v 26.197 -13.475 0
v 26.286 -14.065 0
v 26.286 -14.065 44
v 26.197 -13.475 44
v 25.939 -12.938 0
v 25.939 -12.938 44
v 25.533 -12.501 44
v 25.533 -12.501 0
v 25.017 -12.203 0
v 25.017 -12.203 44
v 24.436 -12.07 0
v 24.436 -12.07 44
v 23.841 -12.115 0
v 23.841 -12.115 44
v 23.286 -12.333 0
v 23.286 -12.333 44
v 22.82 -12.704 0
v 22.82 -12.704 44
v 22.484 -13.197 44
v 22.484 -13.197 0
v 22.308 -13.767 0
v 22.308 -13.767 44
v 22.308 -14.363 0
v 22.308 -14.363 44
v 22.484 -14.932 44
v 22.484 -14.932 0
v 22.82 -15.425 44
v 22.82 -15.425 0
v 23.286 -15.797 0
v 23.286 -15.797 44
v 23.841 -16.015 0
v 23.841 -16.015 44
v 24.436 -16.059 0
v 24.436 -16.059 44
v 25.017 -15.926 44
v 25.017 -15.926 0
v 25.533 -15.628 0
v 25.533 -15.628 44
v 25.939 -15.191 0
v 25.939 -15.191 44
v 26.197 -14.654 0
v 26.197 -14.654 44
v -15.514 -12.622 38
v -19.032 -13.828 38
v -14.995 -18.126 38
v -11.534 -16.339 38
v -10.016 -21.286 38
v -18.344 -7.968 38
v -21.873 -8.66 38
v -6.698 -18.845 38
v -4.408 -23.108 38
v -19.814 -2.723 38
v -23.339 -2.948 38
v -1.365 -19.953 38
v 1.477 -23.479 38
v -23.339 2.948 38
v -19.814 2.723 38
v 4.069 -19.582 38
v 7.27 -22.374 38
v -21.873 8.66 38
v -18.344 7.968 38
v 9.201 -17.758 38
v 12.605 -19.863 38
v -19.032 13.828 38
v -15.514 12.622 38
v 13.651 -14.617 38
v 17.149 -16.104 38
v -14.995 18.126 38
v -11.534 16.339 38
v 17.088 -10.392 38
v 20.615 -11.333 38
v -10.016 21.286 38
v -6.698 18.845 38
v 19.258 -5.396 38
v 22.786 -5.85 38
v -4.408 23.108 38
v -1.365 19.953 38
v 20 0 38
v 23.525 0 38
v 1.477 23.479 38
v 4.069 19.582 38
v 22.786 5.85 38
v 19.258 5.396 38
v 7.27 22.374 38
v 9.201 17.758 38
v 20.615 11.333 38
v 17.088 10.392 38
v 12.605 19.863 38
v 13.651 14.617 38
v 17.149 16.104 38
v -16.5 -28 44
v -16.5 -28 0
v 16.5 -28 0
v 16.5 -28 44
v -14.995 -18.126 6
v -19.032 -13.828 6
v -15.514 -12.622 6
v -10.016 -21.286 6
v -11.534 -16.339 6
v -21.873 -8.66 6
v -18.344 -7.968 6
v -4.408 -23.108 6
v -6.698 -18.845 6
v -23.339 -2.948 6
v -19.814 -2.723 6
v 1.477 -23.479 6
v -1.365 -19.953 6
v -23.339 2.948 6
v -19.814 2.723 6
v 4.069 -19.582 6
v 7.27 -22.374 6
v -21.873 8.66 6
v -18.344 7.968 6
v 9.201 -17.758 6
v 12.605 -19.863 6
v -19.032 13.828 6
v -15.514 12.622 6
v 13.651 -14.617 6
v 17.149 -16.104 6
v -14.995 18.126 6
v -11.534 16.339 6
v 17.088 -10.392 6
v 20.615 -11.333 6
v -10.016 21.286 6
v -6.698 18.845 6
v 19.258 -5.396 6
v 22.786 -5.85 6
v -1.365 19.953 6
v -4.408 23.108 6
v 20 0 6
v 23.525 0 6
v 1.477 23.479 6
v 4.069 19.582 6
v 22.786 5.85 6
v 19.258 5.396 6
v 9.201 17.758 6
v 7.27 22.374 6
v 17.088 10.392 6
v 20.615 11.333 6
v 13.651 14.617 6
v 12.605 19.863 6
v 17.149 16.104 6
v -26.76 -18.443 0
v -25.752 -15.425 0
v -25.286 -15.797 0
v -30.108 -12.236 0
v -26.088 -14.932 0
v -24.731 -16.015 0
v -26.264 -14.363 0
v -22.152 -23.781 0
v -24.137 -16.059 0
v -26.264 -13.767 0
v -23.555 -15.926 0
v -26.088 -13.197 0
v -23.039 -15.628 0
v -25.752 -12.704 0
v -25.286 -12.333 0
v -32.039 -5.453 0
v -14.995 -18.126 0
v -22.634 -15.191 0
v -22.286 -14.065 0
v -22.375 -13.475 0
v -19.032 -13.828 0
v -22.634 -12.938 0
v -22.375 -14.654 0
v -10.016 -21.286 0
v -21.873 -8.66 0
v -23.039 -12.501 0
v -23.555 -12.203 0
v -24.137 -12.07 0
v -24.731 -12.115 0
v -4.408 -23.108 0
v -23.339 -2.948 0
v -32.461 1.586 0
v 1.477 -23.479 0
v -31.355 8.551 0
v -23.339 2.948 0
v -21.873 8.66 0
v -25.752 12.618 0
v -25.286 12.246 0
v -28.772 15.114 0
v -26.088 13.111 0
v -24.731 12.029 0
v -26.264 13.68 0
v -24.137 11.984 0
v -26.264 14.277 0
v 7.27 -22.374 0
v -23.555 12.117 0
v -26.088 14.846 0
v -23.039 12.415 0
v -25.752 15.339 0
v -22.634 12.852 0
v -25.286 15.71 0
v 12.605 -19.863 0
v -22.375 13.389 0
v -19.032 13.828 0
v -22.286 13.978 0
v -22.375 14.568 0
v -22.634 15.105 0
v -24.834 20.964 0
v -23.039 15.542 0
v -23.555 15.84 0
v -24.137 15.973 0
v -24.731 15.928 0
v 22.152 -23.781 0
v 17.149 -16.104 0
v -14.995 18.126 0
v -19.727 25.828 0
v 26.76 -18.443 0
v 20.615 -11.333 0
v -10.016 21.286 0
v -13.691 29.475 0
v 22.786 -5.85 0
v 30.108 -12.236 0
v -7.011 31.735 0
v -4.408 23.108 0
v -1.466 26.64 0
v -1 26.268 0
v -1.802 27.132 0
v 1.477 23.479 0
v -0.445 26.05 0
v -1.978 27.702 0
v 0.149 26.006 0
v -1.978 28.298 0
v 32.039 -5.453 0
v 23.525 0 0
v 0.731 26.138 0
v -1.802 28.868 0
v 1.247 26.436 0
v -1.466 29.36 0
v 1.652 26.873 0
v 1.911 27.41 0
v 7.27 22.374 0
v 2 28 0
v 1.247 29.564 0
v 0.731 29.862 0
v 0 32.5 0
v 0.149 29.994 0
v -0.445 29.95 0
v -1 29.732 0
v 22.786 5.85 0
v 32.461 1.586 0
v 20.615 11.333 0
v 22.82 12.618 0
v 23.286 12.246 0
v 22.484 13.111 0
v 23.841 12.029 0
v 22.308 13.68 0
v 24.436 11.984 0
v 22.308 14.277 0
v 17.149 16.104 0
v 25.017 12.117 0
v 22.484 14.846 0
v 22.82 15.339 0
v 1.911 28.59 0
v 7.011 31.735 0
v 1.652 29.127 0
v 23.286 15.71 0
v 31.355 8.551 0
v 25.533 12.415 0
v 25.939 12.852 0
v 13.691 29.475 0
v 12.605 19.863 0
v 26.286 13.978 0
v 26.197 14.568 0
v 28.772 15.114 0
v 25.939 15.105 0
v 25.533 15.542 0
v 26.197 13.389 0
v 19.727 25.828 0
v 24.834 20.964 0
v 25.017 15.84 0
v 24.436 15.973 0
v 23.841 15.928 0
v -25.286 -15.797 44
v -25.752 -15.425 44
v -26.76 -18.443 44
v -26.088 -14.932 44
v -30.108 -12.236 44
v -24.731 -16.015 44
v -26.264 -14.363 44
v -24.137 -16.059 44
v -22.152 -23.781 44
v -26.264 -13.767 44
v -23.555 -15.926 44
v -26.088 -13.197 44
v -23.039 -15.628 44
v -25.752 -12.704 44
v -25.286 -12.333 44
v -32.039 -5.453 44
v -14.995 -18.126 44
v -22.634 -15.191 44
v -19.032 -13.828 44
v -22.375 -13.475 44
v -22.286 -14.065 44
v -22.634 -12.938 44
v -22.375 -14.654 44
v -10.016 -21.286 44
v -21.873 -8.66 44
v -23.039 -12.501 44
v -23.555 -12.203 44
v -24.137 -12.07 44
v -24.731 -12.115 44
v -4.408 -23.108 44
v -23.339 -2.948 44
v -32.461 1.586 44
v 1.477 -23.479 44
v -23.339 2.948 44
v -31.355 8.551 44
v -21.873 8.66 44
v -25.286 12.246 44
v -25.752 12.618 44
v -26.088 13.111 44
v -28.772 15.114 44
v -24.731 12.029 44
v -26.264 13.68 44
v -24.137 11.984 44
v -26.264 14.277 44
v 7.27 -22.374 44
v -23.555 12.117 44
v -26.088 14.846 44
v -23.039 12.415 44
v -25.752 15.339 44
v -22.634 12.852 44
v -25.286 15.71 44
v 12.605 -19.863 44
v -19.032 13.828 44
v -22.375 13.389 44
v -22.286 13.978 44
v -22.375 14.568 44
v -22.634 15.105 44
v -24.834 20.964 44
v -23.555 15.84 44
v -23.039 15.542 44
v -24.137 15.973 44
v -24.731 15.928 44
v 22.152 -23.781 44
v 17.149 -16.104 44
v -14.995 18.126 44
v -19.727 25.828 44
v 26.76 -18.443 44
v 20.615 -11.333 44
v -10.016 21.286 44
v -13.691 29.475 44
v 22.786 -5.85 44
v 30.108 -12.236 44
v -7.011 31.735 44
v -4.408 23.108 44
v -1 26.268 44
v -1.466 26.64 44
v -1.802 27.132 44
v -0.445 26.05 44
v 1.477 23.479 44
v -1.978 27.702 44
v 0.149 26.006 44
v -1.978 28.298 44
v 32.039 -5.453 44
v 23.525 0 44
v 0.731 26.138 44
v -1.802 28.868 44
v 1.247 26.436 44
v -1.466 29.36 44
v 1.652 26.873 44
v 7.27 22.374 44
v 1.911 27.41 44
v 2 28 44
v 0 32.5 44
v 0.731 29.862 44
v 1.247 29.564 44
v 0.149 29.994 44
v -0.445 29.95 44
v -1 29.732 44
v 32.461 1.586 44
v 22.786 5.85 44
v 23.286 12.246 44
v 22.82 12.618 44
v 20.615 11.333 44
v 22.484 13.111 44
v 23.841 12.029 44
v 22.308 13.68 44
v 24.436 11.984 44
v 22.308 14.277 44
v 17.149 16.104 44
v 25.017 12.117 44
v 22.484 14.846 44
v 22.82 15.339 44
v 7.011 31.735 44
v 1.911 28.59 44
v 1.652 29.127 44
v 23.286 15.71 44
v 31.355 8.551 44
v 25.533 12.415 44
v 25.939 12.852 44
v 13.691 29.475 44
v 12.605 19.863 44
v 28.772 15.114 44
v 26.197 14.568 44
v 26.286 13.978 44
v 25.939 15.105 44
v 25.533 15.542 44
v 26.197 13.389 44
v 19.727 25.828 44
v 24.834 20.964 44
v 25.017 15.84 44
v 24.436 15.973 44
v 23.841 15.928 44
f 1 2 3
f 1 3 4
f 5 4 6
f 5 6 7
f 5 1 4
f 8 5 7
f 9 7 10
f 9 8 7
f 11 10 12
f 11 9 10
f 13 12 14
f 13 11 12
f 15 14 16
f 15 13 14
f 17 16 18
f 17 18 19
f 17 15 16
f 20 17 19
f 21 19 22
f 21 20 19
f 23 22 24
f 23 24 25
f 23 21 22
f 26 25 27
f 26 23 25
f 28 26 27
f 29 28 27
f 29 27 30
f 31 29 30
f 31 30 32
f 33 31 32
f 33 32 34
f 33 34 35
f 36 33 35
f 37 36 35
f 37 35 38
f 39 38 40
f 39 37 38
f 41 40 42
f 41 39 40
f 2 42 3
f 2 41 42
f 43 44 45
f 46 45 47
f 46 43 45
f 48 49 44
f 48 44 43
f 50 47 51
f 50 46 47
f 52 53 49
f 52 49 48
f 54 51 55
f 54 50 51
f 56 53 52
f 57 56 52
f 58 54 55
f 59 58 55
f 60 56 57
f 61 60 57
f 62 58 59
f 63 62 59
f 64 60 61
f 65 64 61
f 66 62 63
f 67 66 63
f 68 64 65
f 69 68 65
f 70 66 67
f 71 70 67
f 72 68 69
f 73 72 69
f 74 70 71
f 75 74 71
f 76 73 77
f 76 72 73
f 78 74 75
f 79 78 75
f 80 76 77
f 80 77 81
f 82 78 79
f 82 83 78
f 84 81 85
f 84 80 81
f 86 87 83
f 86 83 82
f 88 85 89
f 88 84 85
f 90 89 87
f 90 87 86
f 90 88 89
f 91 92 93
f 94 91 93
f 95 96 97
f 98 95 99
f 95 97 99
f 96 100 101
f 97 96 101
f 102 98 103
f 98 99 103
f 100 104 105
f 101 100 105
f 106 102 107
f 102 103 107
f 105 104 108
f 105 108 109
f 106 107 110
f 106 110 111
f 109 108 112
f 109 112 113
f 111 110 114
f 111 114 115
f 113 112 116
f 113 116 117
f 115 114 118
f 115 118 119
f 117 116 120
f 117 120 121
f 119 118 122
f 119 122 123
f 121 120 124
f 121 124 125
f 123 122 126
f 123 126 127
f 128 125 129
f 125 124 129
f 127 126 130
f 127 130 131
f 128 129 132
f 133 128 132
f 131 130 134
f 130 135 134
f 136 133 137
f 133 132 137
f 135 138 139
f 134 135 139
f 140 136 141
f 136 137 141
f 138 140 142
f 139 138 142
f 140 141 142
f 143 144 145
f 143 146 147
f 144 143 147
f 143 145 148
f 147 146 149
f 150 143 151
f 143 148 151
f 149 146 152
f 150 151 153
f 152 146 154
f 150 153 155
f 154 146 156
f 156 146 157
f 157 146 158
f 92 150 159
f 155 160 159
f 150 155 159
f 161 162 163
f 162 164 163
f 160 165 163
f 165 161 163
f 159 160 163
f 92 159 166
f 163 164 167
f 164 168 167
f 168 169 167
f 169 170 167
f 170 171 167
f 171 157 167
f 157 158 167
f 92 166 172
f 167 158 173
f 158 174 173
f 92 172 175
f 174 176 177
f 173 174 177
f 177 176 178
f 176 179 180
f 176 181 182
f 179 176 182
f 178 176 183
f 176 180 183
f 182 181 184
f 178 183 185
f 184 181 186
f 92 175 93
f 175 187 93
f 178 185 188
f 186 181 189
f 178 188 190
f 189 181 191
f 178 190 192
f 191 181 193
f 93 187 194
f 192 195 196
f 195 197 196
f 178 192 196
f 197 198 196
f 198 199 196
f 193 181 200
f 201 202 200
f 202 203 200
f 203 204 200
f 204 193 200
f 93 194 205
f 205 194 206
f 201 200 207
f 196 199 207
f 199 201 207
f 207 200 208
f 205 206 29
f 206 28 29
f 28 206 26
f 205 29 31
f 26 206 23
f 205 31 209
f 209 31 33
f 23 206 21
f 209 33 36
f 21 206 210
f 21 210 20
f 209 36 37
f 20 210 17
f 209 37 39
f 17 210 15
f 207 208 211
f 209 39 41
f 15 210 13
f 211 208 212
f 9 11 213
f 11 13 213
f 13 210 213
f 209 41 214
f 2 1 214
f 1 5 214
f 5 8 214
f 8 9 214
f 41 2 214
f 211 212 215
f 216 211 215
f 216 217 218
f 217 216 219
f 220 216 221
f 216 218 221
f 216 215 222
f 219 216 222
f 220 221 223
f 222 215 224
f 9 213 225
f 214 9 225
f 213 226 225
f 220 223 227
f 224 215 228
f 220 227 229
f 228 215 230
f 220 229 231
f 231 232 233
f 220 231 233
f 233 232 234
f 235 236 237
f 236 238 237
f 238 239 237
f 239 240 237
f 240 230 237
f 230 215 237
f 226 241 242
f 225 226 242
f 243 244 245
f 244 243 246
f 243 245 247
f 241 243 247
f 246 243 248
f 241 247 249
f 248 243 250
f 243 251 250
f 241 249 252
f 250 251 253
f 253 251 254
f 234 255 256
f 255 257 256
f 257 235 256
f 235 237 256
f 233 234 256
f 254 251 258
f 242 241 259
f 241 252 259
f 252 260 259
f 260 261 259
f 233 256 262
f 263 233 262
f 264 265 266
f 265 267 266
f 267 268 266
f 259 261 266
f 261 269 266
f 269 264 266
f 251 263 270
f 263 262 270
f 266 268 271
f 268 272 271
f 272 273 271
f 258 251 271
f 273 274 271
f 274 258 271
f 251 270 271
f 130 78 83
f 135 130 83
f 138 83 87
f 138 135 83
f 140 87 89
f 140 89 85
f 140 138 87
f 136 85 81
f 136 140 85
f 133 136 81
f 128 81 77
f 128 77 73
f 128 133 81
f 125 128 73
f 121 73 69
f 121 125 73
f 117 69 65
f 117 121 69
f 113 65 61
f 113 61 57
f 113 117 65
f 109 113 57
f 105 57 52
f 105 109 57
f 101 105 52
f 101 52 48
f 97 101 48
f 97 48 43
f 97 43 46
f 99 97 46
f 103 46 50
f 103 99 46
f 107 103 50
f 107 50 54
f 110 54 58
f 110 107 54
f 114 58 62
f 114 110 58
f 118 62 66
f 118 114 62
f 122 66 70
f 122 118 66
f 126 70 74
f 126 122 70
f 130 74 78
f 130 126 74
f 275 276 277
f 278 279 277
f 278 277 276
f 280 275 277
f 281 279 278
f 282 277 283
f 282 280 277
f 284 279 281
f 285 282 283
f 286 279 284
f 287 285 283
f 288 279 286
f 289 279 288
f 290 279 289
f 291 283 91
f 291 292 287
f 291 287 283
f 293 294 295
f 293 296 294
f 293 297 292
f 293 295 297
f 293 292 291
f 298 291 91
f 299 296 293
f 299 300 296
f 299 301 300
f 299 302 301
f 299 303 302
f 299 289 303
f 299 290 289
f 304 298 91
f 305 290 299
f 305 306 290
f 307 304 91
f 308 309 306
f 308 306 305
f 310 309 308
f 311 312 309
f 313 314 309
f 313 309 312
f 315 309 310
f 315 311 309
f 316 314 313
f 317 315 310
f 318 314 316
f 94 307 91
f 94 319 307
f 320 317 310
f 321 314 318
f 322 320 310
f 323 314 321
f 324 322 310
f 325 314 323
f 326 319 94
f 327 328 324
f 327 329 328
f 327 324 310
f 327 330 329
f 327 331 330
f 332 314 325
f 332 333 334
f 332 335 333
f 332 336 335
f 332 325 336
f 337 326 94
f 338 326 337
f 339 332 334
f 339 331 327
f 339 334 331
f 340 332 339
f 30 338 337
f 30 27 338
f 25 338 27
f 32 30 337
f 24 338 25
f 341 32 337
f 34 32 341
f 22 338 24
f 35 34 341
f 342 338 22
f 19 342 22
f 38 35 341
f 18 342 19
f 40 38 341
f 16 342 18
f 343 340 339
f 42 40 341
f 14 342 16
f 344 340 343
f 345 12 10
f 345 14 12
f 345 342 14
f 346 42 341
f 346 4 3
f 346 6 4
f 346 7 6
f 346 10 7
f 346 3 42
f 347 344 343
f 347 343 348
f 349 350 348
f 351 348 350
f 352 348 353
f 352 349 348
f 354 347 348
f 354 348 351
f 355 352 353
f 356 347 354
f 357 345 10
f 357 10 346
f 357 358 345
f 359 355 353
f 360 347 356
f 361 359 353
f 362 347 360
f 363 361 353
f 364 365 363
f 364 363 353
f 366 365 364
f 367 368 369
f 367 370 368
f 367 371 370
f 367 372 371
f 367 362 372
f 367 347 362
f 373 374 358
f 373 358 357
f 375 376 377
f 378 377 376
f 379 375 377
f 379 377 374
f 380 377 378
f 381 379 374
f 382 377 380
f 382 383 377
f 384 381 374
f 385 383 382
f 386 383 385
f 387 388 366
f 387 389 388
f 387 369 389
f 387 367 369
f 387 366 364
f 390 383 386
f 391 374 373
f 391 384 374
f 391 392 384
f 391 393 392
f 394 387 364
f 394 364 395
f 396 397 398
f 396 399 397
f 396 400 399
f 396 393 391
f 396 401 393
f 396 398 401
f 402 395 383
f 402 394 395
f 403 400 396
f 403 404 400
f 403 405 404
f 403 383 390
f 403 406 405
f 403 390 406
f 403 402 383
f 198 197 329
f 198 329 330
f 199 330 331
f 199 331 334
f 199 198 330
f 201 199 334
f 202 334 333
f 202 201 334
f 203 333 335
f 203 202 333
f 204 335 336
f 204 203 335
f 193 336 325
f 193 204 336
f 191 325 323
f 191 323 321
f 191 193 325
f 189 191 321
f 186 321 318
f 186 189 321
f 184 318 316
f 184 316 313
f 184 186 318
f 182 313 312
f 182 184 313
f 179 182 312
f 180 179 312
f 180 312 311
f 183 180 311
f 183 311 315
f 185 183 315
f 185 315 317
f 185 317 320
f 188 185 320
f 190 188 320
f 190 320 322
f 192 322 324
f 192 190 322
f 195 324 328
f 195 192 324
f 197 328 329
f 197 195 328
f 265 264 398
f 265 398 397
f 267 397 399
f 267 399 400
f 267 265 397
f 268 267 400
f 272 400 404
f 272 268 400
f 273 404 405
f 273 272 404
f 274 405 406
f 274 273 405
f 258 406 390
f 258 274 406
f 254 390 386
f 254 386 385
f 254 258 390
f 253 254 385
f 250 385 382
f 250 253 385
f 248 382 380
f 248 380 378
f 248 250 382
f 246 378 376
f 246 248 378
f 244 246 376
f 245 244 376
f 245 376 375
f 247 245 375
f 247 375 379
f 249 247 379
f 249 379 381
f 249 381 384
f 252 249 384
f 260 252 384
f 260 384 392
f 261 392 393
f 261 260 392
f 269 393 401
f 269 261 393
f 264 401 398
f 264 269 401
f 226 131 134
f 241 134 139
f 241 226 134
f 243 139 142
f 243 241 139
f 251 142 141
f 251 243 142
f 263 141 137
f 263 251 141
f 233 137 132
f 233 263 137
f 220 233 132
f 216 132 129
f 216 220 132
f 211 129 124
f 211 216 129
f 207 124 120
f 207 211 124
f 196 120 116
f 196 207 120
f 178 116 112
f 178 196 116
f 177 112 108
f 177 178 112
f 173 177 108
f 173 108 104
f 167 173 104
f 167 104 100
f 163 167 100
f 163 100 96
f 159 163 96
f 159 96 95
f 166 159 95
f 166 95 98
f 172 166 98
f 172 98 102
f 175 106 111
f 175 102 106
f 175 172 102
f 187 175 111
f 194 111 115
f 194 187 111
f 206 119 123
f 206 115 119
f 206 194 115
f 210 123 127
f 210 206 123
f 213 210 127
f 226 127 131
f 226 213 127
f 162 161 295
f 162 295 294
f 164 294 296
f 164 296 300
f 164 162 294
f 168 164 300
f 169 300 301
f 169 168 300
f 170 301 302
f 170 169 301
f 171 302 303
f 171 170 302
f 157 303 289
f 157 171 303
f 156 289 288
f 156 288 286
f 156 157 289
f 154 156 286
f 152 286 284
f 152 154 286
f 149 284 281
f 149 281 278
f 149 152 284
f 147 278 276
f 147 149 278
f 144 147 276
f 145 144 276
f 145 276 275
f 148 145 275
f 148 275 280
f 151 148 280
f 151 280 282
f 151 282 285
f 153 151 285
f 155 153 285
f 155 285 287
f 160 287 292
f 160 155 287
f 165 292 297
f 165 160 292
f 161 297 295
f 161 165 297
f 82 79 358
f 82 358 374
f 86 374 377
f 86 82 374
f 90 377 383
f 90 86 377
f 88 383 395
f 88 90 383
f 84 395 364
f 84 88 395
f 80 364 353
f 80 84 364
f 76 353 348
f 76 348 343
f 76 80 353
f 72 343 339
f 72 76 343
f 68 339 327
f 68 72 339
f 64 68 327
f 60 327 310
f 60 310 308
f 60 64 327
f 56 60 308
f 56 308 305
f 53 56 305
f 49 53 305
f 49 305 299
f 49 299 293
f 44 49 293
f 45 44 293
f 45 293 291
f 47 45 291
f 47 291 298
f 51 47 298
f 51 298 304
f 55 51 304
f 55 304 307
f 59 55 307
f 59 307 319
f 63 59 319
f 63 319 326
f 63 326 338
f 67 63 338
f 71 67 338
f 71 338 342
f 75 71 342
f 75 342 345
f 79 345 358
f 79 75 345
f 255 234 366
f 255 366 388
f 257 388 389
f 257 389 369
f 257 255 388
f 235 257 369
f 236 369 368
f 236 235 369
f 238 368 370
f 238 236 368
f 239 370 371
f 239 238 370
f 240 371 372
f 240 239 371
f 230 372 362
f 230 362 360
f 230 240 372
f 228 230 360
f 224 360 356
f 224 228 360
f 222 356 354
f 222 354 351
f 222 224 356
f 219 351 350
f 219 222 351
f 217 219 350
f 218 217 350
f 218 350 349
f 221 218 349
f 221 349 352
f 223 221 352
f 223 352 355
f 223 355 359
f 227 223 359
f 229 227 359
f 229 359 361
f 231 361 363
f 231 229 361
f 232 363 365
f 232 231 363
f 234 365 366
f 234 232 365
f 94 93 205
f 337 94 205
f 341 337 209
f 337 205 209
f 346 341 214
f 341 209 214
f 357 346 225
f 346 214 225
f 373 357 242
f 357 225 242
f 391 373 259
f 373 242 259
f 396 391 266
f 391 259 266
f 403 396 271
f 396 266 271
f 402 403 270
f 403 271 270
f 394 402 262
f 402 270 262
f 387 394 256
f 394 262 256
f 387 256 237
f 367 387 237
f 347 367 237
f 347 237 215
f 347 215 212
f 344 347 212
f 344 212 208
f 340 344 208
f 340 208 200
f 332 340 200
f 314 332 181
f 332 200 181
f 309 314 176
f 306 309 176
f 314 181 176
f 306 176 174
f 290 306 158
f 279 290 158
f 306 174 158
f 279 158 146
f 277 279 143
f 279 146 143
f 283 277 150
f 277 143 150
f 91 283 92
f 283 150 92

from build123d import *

# Parameters (mm, degrees)
SKETCH1_R                = 23.525
SKETCH1_R_2              = 2
BOSS_EXTRUDE1_DEPTH      = 44
BOSS_EXTRUDE2_DEPTH      = 16
BOSS_EXTRUDE2_DEPTH_BACK = 16
SKETCH2_R                = 23.6
SKETCH2_R_2              = 20


with BuildPart() as part:
    # Sketch1 → Boss-Extrude1 (new body)
    with BuildSketch(Plane.XY):
        with BuildLine():
            Line((-16.5, -28), (16.5, -28))
            ThreePointArc((16.5, -28), (0, 32.5), (-16.5, -28))
        make_face()
        Circle(SKETCH1_R, mode=Mode.SUBTRACT)
        with Locations((0, 28)):
            Circle(SKETCH1_R_2, mode=Mode.SUBTRACT)
        with Locations((24.286071043, 13.978430346)):
            Circle(SKETCH1_R_2, mode=Mode.SUBTRACT)
        with Locations((24.286071043, -14.064708963)):
            Circle(SKETCH1_R_2, mode=Mode.SUBTRACT)
        with Locations((-24.286071043, -14.064708963)):
            Circle(SKETCH1_R_2, mode=Mode.SUBTRACT)
        with Locations((-24.286071043, 13.978430346)):
            Circle(SKETCH1_R_2, mode=Mode.SUBTRACT)
    extrude(amount=BOSS_EXTRUDE1_DEPTH)

    # Sketch2 → Boss-Extrude2 (add, two sides: drawn at the far end of the back side and taken through both)
    with BuildSketch(Plane.XY.offset(22).offset(-BOSS_EXTRUDE2_DEPTH_BACK)):
        Circle(SKETCH2_R)
        Circle(SKETCH2_R_2, mode=Mode.SUBTRACT)
    extrude(amount=BOSS_EXTRUDE2_DEPTH + BOSS_EXTRUDE2_DEPTH_BACK)


solid = part.part
